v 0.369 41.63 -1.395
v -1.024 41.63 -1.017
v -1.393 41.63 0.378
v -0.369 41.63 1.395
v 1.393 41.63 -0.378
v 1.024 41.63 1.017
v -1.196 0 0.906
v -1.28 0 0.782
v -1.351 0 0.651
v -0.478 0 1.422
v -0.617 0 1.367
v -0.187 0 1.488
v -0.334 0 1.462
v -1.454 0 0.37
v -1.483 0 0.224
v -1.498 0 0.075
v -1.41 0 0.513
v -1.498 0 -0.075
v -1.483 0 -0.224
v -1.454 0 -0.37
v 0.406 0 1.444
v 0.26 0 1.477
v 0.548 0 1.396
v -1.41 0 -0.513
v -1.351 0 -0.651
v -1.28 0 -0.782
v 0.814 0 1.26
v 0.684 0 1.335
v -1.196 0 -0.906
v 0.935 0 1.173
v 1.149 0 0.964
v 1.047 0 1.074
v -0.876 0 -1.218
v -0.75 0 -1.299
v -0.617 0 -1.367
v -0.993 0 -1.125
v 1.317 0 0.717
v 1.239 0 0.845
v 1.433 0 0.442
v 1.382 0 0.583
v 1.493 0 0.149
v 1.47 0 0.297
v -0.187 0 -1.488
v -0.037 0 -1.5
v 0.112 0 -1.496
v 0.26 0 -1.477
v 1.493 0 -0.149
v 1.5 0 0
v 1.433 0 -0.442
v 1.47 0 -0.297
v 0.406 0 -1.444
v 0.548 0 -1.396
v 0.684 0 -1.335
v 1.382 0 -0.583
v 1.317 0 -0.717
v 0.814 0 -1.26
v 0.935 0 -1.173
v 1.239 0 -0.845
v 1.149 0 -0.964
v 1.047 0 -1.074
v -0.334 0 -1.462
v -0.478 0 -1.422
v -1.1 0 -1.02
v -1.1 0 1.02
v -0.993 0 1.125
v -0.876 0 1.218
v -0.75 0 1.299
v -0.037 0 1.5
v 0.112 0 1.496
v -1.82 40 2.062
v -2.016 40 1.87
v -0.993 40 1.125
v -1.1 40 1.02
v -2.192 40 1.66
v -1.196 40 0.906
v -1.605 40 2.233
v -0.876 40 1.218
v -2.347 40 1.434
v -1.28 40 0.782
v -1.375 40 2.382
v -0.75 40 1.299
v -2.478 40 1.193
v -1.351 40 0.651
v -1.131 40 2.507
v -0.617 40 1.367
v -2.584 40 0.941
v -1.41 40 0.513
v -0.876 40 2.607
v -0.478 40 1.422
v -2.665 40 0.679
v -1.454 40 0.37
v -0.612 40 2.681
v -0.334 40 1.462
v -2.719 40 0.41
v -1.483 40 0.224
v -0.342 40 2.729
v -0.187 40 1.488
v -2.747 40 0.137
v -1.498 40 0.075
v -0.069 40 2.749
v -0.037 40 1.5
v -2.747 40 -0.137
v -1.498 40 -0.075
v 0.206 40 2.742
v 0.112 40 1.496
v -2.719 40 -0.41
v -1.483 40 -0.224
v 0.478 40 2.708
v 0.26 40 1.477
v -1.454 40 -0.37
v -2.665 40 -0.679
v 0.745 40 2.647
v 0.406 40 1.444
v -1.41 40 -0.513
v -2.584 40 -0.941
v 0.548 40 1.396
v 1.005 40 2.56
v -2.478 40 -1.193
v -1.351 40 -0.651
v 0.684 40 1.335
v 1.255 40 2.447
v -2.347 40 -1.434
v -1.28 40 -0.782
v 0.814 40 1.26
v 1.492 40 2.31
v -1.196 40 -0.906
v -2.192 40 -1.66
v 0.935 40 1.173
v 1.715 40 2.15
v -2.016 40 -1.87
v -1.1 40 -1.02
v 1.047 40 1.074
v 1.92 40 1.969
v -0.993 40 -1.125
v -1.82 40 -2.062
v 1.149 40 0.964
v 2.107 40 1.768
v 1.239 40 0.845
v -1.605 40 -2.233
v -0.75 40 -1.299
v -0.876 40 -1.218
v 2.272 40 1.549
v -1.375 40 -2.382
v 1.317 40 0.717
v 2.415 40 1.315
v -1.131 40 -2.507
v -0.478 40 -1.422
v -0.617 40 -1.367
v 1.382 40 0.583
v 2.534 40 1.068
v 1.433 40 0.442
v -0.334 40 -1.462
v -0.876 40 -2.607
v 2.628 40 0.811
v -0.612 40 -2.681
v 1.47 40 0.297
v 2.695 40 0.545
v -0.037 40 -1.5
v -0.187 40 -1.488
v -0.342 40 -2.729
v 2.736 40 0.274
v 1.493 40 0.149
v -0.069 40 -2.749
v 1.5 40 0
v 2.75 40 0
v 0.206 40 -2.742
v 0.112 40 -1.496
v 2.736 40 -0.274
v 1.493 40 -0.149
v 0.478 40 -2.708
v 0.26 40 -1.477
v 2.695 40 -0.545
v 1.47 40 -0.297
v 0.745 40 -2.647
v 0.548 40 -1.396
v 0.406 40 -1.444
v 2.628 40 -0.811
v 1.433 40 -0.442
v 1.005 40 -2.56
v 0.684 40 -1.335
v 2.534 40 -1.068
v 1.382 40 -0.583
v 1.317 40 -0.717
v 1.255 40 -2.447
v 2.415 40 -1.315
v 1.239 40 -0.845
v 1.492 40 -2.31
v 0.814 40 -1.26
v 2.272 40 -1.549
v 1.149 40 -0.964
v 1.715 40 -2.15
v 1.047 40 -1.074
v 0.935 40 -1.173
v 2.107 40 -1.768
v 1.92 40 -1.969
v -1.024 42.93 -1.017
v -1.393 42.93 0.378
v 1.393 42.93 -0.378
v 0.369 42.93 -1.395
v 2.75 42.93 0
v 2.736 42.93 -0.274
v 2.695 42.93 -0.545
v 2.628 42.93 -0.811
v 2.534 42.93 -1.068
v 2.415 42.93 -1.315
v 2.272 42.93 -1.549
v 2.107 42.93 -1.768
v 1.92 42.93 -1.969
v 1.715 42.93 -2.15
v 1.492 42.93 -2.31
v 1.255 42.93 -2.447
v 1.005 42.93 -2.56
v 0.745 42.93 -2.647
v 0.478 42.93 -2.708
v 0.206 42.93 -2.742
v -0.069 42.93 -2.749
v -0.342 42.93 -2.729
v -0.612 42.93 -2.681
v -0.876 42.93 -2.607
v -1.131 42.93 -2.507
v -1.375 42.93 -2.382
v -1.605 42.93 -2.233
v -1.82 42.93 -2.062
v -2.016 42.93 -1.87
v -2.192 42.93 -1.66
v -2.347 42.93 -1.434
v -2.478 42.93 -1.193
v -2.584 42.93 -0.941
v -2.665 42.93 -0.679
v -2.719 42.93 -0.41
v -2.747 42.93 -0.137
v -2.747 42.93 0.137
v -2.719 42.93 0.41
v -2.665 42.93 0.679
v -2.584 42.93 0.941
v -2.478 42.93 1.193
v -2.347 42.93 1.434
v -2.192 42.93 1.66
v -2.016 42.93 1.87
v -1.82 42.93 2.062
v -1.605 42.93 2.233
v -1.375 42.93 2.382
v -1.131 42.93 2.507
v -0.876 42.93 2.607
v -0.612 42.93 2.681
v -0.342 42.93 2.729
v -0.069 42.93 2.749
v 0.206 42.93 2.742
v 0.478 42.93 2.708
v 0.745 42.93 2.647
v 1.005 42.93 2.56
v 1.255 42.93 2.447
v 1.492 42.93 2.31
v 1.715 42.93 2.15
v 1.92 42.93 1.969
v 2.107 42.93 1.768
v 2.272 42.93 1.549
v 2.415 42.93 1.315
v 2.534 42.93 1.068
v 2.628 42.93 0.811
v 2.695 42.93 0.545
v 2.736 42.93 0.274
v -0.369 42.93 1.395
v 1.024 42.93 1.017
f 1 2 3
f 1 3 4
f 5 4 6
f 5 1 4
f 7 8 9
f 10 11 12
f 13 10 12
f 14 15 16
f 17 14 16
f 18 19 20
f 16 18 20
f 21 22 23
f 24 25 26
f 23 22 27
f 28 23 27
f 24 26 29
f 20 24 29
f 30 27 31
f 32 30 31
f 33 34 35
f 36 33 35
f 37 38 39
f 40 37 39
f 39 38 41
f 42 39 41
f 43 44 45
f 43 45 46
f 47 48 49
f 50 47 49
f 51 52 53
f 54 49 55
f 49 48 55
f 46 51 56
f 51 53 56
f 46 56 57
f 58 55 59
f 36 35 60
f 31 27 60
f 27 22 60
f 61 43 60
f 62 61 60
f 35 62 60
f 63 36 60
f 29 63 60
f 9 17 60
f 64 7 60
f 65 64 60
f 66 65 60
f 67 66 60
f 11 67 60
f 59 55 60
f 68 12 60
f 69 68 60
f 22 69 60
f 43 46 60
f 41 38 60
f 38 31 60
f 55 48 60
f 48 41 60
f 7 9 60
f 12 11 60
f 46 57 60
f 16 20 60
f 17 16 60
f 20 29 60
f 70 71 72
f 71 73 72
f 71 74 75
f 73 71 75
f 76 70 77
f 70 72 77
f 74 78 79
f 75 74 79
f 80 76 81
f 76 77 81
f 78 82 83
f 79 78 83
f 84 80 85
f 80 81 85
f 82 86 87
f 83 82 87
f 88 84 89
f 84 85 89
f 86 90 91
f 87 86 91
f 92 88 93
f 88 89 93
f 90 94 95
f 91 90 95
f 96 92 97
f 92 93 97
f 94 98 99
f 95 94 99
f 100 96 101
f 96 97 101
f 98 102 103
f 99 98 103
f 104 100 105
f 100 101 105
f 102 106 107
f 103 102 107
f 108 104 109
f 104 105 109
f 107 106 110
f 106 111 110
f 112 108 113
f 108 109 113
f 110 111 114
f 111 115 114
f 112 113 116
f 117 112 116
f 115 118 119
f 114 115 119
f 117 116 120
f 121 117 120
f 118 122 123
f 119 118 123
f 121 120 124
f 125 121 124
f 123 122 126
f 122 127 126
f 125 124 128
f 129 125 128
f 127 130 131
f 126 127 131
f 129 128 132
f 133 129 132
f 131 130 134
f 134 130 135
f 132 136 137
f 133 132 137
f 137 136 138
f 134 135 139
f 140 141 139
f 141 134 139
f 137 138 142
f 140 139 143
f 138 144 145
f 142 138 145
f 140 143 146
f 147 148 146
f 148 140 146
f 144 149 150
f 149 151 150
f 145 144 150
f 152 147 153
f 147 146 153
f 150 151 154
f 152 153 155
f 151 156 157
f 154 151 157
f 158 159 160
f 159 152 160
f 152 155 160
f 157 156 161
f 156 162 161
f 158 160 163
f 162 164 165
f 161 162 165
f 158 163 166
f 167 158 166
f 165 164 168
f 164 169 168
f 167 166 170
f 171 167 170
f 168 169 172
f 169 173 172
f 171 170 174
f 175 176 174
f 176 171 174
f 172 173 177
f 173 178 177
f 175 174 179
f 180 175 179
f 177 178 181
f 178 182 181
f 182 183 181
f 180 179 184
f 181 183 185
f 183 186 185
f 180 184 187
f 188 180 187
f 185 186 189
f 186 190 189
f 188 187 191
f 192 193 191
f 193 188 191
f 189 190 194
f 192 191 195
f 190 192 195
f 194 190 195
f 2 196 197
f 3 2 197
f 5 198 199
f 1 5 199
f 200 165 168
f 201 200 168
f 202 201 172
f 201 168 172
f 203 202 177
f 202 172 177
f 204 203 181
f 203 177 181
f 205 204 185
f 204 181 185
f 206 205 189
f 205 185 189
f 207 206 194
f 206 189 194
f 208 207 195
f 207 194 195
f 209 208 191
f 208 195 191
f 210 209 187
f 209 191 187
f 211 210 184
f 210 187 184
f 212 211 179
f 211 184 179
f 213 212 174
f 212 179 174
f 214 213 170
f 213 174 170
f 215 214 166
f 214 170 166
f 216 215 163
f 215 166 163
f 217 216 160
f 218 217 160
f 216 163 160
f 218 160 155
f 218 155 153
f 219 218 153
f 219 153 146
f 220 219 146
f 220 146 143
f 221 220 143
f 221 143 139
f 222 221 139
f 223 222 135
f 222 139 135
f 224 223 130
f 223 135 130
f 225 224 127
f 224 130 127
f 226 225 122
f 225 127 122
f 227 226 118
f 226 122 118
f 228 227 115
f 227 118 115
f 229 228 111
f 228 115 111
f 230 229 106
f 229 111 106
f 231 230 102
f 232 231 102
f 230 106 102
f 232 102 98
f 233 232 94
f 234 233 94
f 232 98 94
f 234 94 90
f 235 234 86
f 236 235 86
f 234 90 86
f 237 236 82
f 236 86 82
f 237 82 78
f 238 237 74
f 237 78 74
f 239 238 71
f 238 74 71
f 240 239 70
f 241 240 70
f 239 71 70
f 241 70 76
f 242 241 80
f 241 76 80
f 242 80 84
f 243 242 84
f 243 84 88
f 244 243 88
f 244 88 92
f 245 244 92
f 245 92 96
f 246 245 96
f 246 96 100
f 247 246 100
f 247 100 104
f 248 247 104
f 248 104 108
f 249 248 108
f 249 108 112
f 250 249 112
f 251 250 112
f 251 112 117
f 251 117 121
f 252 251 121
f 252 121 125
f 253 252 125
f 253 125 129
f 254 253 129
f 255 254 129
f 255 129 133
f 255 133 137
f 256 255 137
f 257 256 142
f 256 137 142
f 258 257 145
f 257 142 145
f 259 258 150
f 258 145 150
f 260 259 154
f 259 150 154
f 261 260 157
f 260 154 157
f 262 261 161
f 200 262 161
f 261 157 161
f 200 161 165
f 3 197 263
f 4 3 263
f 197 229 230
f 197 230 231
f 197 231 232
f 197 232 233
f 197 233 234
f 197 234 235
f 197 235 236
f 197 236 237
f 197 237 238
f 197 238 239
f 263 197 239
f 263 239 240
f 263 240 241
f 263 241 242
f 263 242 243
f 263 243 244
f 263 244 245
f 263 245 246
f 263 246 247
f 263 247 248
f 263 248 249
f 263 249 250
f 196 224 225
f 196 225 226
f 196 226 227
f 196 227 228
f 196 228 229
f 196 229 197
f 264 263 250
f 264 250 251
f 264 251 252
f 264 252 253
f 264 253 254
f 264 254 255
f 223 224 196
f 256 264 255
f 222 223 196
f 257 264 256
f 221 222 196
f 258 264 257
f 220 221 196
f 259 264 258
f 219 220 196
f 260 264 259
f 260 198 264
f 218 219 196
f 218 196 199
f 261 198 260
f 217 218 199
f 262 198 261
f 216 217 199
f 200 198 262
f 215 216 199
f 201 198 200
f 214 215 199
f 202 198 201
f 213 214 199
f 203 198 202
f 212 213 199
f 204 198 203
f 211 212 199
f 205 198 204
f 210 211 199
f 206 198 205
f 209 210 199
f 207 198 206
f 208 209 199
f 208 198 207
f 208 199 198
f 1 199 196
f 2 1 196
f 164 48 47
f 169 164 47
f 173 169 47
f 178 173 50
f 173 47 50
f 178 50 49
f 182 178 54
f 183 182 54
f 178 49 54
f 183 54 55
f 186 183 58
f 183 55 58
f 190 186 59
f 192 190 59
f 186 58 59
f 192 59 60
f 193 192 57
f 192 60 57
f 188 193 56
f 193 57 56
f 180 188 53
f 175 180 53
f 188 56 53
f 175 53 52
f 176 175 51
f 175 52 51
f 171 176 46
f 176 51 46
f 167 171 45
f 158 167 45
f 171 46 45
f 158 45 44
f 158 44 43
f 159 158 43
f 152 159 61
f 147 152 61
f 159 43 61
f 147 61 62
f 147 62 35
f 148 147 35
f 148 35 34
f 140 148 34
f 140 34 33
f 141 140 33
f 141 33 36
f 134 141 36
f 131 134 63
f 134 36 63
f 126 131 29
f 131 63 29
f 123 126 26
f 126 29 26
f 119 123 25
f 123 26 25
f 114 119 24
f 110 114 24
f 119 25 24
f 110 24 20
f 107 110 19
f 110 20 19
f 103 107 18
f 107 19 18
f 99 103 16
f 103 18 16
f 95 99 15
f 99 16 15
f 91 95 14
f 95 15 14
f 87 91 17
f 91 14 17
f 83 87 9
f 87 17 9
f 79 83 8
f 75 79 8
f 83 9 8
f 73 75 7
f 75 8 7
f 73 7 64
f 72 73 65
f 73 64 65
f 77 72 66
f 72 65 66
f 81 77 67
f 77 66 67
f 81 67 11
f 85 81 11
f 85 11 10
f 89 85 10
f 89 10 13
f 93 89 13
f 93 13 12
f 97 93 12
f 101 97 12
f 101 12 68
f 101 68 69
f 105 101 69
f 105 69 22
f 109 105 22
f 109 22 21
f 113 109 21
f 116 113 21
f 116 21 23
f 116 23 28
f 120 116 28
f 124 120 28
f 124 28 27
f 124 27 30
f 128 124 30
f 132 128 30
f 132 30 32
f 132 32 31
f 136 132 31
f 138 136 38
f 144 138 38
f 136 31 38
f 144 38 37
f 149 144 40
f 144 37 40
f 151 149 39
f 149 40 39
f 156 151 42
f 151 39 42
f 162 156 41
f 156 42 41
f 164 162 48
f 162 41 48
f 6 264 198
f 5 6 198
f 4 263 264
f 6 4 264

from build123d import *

# Parameters (mm, degrees)
SKETCH_1_R          = 1.5
EXTRUDE_1_DEPTH     = 40
SKETCH_2_R          = 2.75
EXTRUDE_2_DEPTH     = 2.93
CUT_EXTRUDE_1_DEPTH = 1.3


with BuildPart() as part:
    # 草图1 → 凸台-拉伸1 (new body)
    with BuildSketch(Plane(origin=(0, 0, 0), x_dir=(1, 0, 0), z_dir=(0, 1, 0))):
        Circle(SKETCH_1_R)
    extrude(amount=EXTRUDE_1_DEPTH)

    # 草图2 → 凸台-拉伸2 (add)
    with BuildSketch(Plane(origin=(0, 40, 0), x_dir=(1, 0, 0), z_dir=(0, 1, 0))):
        Circle(SKETCH_2_R)
    extrude(amount=EXTRUDE_2_DEPTH)

    # 草图3 → 切除-拉伸1 (cut)
    with BuildSketch(Plane(origin=(0, 42.93, 0), x_dir=(1, 0, 0), z_dir=(0, 1, 0))):
        Polygon((1.024005842, -1.017224346), (1.392945046, 0.378202899), (0.368939204, 1.395427245), (-1.024005842, 1.017224346), (-1.392945046, -0.378202899), (-0.368939204, -1.395427245), align=None)
    extrude(amount=-CUT_EXTRUDE_1_DEPTH, mode=Mode.SUBTRACT)


solid = part.part
